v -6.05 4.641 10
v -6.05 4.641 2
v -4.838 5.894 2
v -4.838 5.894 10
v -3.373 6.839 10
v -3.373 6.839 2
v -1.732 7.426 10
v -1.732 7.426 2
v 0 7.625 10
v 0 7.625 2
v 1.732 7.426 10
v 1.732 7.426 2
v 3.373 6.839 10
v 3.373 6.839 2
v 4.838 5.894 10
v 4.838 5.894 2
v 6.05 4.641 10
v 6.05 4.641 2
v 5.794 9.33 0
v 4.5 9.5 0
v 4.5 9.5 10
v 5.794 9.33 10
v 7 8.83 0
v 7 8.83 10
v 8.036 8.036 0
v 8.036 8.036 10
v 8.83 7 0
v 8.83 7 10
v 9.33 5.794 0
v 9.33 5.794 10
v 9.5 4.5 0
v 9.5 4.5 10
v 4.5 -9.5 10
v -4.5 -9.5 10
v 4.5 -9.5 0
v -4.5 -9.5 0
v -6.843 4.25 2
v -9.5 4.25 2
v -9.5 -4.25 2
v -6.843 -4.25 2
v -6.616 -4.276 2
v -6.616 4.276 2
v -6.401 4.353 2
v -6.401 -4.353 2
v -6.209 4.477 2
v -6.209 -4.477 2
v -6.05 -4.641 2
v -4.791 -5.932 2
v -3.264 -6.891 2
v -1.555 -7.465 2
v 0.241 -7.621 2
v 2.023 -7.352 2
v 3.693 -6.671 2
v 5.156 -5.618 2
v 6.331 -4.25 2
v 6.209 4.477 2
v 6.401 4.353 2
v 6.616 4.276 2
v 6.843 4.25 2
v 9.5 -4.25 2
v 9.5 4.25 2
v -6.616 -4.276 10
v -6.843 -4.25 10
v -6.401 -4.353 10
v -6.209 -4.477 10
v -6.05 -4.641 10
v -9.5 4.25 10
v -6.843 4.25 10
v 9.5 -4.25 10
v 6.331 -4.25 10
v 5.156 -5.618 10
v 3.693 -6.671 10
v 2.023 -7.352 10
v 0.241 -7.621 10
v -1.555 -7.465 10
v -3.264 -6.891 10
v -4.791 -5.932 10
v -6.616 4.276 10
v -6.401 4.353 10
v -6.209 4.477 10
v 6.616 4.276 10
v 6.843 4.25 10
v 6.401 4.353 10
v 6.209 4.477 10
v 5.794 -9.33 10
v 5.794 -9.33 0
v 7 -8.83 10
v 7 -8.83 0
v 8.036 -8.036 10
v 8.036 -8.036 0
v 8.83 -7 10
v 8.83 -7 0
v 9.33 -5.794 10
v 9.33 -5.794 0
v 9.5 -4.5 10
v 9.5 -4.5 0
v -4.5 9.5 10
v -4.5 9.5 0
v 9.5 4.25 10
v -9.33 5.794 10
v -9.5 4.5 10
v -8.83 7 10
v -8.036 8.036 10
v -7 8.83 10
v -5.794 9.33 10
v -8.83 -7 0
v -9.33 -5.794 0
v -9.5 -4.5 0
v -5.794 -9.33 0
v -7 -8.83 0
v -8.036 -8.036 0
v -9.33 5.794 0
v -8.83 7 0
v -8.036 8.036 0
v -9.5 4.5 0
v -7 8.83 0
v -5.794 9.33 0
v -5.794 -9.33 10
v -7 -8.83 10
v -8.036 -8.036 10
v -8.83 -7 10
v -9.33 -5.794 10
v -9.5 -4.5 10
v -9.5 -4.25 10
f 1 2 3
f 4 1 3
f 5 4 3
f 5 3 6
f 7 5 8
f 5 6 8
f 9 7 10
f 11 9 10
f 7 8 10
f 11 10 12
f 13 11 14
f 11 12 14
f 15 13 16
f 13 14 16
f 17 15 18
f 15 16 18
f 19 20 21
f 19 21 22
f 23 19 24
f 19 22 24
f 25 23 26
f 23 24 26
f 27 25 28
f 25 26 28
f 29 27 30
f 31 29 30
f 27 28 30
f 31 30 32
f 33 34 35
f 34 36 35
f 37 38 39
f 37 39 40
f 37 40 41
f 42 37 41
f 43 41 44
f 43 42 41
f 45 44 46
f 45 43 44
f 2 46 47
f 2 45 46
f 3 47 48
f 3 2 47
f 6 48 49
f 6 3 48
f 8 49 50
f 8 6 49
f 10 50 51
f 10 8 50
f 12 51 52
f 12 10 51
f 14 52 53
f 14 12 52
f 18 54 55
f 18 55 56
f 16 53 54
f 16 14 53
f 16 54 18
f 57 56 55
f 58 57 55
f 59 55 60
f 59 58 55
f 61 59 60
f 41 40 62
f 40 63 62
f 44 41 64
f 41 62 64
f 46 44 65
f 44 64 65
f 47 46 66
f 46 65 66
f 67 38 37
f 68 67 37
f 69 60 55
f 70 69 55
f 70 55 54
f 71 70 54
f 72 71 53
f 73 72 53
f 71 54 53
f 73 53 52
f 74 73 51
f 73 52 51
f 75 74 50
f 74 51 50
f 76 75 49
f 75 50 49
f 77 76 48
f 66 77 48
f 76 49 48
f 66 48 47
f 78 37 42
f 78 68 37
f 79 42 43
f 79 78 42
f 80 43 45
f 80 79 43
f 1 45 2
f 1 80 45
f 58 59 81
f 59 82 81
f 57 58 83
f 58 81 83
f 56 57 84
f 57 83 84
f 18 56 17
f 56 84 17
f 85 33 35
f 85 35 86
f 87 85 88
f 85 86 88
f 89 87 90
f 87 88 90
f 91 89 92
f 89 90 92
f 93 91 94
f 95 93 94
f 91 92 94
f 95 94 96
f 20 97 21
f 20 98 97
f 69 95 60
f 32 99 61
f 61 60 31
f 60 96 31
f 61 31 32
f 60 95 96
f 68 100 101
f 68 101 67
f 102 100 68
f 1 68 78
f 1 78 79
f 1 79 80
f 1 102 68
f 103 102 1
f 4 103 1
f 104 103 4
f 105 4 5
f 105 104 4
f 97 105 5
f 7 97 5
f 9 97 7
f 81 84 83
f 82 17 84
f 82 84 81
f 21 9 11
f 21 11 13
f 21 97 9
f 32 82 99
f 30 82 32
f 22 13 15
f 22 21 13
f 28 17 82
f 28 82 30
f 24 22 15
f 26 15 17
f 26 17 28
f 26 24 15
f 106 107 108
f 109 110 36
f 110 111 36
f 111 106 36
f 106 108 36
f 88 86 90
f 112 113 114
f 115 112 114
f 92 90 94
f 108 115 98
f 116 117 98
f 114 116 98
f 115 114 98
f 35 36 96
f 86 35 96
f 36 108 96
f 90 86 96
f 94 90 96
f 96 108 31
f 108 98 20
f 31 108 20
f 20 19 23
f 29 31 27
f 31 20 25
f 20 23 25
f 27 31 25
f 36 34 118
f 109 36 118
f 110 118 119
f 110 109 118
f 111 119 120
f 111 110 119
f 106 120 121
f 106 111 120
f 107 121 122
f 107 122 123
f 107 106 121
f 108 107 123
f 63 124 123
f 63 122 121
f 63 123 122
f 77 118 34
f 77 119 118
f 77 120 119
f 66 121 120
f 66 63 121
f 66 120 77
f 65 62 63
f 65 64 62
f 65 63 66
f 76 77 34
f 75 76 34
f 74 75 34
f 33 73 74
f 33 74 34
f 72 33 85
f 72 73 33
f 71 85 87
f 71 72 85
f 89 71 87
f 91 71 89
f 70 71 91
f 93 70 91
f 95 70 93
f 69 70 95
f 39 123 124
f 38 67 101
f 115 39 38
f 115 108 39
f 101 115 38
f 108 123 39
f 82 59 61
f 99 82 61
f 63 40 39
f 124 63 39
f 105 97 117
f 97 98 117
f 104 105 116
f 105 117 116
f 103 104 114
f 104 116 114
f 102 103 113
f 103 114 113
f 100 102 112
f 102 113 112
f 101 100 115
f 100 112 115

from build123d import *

# Parameters (mm, degrees)
F0_W     = 19
F0_H     = 19
F1_DEPTH = 2
F3_DEPTH = 8
F4_R     = 5
F5_R     = 1


with BuildPart() as f1:
    # F0 (on Top) → F1 (new body)
    with BuildSketch(Plane.XY):
        Rectangle(F0_W, F0_H)
    extrude(amount=F1_DEPTH)

    # F2 (on face) → F3 (join)
    with BuildSketch(Plane.XY.offset(2)):
        with BuildLine():
            Line((9.5, -4.25), (6.3307286311, -4.25))
            ThreePointArc((6.3307286311, -4.25), (0, -7.625), (-6.3307286311, -4.25))
            Line((-6.3307286311, -4.25), (-9.5, -4.25))
            Line((-9.5, -4.25), (-9.5, -9.5))
            Line((-9.5, -9.5), (9.5, -9.5))
            Line((9.5, -9.5), (9.5, -4.25))
        make_face()
        with BuildLine():
            ThreePointArc((-6.3307286311, 4.25), (0, 7.625), (6.3307286311, 4.25))
            Line((6.3307286311, 4.25), (9.5, 4.25))
            Line((9.5, 4.25), (9.5, 9.5))
            Line((9.5, 9.5), (-9.5, 9.5))
            Line((-9.5, 9.5), (-9.5, 4.25))
            Line((-9.5, 4.25), (-6.3307286311, 4.25))
        make_face()
    extrude(amount=F3_DEPTH)

    # F4
    f4_edges = [f1.edges().sort_by_distance(p)[0] for p in [
        (-9.5, -9.5, 5),
        (9.5, -9.5, 5),
        (9.5, 9.5, 5),
        (-9.5, 9.5, 5),
    ]]
    fillet(f4_edges, radius=F4_R)

    # F5
    f5_edges = [f1.edges().sort_by_distance(p)[0] for p in [
        (6.330729, 4.25, 6),
        (-6.330729, 4.25, 6),
        (-6.330729, -4.25, 6),
    ]]
    fillet(f5_edges, radius=F5_R)


solid = f1.part
